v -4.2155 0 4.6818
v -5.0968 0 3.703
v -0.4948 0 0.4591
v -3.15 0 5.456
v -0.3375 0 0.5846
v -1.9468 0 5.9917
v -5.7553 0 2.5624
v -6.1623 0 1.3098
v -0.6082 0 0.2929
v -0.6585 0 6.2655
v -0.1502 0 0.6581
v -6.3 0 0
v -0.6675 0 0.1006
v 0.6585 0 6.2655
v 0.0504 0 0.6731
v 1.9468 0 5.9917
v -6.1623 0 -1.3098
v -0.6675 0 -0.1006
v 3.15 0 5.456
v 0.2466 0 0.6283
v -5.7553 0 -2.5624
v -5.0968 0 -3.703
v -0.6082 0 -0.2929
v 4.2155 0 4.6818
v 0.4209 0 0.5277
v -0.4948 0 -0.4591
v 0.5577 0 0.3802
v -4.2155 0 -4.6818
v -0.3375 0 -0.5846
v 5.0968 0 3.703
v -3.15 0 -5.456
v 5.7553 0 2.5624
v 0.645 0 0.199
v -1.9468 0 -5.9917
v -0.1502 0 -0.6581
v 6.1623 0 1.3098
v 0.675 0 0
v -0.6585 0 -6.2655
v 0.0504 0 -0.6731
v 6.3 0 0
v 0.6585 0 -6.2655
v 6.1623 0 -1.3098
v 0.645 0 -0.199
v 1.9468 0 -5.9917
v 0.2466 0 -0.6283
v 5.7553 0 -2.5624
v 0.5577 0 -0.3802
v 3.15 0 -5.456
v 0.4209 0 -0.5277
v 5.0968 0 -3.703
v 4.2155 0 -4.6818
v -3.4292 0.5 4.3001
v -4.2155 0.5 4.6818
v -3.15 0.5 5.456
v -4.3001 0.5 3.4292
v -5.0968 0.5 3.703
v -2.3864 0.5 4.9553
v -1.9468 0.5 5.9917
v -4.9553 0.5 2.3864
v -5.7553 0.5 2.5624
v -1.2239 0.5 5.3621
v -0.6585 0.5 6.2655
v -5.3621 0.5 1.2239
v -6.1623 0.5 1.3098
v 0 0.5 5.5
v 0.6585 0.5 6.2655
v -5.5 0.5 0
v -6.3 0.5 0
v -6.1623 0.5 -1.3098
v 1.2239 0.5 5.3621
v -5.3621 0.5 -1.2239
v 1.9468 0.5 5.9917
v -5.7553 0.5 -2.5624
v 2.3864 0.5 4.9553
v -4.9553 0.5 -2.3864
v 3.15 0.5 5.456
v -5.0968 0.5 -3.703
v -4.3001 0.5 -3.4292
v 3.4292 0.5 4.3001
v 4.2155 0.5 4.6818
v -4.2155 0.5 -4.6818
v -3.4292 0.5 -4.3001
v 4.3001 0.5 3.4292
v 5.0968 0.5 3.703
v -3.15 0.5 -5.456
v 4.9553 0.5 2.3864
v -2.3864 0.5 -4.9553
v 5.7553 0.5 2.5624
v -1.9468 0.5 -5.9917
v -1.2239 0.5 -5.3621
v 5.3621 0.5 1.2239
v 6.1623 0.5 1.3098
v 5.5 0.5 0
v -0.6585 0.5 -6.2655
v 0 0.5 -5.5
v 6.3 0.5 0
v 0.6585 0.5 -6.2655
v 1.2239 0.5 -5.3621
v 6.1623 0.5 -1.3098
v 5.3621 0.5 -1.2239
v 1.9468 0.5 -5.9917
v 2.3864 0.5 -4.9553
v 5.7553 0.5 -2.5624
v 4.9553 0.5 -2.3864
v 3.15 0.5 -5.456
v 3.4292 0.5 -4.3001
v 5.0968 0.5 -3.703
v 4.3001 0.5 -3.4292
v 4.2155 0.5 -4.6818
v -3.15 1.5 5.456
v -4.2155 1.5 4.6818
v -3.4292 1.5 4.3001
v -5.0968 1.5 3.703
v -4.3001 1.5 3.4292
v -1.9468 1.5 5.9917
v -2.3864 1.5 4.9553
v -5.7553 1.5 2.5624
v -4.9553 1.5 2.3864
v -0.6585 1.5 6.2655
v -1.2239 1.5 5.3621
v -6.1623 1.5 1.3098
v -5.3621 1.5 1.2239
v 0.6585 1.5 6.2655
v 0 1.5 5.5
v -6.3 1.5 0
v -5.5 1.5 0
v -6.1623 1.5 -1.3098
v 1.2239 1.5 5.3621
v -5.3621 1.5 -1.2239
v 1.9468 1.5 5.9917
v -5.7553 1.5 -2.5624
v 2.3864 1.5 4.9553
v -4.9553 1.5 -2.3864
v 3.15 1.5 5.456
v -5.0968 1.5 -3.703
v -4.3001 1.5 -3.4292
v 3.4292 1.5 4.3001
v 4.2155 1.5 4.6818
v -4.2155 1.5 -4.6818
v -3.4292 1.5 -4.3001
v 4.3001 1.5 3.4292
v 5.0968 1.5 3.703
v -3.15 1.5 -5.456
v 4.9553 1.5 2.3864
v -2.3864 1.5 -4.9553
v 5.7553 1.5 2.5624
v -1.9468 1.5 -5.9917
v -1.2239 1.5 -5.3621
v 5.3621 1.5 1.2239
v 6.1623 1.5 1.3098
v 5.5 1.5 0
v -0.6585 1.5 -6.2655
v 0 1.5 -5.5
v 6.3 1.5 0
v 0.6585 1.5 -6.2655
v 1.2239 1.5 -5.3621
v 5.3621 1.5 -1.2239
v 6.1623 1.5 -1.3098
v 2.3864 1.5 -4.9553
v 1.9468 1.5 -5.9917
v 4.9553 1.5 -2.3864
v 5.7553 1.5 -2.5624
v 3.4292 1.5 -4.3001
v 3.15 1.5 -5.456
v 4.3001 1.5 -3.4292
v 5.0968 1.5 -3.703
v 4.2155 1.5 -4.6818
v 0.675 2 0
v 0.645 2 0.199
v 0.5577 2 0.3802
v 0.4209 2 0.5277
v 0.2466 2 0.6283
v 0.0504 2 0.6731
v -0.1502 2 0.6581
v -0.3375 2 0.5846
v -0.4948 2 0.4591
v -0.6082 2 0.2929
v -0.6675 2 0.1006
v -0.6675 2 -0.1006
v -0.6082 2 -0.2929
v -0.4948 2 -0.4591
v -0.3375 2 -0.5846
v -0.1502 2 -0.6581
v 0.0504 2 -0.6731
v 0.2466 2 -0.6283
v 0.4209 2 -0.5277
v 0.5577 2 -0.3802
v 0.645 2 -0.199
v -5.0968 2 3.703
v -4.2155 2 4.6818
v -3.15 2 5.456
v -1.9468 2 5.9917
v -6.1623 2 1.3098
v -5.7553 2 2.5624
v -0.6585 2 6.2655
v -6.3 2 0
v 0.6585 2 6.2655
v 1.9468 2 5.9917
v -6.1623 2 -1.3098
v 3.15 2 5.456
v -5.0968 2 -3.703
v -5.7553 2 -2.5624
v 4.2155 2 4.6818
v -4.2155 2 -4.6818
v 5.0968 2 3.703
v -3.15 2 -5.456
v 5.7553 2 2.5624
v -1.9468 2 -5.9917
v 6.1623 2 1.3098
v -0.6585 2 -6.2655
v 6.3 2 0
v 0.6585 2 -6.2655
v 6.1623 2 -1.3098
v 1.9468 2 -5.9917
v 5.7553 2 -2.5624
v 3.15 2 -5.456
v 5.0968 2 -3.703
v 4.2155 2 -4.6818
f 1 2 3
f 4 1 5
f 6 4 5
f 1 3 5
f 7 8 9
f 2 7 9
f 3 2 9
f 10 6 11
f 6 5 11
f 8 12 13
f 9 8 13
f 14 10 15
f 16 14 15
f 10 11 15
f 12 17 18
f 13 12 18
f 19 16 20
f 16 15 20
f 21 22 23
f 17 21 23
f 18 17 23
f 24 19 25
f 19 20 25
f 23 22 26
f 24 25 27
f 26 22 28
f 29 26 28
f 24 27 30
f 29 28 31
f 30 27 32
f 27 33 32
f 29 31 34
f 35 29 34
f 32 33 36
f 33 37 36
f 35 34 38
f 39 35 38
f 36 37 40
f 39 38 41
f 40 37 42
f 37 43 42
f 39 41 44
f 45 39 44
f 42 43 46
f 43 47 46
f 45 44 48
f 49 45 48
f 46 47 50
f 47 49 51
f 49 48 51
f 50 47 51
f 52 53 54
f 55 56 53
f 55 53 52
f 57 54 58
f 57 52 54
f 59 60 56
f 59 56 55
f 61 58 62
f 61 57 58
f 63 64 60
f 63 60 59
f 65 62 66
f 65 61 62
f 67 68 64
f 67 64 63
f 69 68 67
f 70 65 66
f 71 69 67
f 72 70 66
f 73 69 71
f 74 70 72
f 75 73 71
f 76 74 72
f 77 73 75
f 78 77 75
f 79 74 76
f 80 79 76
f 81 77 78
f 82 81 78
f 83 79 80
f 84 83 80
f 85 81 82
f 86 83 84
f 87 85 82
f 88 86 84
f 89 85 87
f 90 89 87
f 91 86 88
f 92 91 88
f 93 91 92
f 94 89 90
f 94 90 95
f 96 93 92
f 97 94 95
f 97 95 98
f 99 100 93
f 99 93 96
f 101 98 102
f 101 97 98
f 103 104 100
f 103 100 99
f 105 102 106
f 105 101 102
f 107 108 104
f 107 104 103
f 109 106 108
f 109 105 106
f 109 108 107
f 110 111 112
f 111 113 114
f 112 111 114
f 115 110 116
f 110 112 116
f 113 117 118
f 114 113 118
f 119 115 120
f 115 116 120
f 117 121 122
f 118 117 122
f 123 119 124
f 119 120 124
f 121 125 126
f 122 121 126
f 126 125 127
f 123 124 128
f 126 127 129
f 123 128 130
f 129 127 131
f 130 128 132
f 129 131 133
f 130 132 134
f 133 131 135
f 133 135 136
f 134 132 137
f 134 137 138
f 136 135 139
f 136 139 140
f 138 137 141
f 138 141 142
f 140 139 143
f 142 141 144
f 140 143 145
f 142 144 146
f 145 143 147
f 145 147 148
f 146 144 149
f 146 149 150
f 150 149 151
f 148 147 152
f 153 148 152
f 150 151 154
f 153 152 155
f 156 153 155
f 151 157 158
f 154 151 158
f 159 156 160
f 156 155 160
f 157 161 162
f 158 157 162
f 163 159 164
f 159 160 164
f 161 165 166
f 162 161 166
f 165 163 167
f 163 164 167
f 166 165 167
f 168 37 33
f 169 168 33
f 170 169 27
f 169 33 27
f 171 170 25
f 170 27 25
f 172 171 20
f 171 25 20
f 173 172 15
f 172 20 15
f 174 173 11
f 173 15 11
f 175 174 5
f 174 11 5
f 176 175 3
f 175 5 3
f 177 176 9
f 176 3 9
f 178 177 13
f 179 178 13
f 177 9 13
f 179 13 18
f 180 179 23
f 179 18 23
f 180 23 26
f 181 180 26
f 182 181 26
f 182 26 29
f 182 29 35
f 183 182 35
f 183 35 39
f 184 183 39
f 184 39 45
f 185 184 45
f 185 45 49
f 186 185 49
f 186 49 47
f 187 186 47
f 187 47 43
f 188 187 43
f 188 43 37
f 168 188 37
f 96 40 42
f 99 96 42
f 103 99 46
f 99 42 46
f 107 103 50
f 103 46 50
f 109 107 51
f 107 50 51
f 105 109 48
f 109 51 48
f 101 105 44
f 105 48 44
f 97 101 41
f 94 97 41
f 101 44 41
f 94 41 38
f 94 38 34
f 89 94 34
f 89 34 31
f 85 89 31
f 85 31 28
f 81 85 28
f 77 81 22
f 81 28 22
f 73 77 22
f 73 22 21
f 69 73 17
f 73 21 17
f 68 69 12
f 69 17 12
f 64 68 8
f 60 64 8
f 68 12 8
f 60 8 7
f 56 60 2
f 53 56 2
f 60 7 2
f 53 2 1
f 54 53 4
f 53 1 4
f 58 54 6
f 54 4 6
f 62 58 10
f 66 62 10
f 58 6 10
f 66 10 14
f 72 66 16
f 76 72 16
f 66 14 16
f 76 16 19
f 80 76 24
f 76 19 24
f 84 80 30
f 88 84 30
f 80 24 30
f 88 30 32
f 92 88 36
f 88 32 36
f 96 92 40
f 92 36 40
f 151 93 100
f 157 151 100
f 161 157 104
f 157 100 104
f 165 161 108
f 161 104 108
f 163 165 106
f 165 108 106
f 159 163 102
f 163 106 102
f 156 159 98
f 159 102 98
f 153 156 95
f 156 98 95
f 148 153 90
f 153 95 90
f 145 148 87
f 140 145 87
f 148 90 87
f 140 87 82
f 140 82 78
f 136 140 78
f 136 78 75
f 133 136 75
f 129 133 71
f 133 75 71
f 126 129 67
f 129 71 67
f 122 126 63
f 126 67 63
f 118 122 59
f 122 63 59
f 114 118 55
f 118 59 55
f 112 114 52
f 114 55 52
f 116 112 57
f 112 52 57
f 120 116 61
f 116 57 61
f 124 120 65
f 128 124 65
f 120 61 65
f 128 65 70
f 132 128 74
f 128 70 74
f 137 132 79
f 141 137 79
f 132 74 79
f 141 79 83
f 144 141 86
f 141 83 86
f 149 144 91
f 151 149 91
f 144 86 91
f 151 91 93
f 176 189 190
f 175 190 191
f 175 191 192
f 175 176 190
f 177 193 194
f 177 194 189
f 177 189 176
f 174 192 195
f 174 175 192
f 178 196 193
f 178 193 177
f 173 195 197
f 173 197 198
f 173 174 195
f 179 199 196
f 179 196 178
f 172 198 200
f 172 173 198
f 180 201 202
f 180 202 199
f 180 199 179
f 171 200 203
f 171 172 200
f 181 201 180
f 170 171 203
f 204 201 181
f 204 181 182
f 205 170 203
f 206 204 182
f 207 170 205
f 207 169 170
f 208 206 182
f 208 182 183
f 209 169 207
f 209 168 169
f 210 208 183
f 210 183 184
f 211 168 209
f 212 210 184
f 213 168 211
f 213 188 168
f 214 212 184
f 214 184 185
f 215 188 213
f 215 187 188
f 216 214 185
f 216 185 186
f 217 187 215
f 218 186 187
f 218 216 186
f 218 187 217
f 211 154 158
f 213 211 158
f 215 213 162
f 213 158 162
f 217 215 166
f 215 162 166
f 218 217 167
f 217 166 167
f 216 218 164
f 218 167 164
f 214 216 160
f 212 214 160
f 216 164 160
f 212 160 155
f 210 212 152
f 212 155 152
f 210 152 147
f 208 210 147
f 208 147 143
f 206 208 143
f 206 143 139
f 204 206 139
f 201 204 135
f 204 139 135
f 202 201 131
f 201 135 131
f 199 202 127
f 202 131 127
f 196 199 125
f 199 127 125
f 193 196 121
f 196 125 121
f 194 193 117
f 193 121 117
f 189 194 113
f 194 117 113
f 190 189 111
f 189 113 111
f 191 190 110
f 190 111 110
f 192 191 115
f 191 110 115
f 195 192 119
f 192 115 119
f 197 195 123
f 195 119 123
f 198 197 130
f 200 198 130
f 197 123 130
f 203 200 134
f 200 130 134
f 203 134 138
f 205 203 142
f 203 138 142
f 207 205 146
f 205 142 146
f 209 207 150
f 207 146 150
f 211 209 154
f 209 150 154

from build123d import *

# Parameters (mm, degrees)
ESBO_O1_R                = 6.3
RESSALTO_EXTRUS_O1_DEPTH = 0.5
ESBO_O10_R               = 5.5
RESSALTO_EXTRUS_O4_DEPTH = 1
ESBO_O11_R               = 6.3
RESSALTO_EXTRUS_O5_DEPTH = 0.5
CORTE_EXTRUS_O1_REACH    = 4
ESBO_O12_R               = 0.675


with BuildPart() as part:
    # Esboço1 → Ressalto-extrusão1 (new body)
    with BuildSketch(Plane(origin=(0, 0, 0), x_dir=(1, 0, 0), z_dir=(0, 1, 0))):
        Circle(ESBO_O1_R)
    extrude(amount=RESSALTO_EXTRUS_O1_DEPTH)

    # Esboço10 → Ressalto-extrusão4 (add)
    with BuildSketch(Plane(origin=(0, 0.5, 0), x_dir=(1, 0, 0), z_dir=(0, 1, 0))):
        Circle(ESBO_O10_R)
    extrude(amount=RESSALTO_EXTRUS_O4_DEPTH)

    # Esboço11 → Ressalto-extrusão5 (add)
    with BuildSketch(Plane(origin=(0, 1.5, 0), x_dir=(1, 0, 0), z_dir=(0, 1, 0))):
        Circle(ESBO_O11_R)
    extrude(amount=RESSALTO_EXTRUS_O5_DEPTH)

    # Esboço12 → Corte-extrusão1 (cut, up to next)
    with BuildSketch(Plane.XZ, mode=Mode.PRIVATE) as corte_extrus_o1_sk1:
        Circle(ESBO_O12_R)
    corte_extrus_o1_tool1 = extrude(corte_extrus_o1_sk1.sketch, amount=-CORTE_EXTRUS_O1_REACH, mode=Mode.PRIVATE) & part.part
    add(corte_extrus_o1_tool1.solids().sort_by_distance((0, 0, 0))[0], mode=Mode.SUBTRACT)


solid = part.part
